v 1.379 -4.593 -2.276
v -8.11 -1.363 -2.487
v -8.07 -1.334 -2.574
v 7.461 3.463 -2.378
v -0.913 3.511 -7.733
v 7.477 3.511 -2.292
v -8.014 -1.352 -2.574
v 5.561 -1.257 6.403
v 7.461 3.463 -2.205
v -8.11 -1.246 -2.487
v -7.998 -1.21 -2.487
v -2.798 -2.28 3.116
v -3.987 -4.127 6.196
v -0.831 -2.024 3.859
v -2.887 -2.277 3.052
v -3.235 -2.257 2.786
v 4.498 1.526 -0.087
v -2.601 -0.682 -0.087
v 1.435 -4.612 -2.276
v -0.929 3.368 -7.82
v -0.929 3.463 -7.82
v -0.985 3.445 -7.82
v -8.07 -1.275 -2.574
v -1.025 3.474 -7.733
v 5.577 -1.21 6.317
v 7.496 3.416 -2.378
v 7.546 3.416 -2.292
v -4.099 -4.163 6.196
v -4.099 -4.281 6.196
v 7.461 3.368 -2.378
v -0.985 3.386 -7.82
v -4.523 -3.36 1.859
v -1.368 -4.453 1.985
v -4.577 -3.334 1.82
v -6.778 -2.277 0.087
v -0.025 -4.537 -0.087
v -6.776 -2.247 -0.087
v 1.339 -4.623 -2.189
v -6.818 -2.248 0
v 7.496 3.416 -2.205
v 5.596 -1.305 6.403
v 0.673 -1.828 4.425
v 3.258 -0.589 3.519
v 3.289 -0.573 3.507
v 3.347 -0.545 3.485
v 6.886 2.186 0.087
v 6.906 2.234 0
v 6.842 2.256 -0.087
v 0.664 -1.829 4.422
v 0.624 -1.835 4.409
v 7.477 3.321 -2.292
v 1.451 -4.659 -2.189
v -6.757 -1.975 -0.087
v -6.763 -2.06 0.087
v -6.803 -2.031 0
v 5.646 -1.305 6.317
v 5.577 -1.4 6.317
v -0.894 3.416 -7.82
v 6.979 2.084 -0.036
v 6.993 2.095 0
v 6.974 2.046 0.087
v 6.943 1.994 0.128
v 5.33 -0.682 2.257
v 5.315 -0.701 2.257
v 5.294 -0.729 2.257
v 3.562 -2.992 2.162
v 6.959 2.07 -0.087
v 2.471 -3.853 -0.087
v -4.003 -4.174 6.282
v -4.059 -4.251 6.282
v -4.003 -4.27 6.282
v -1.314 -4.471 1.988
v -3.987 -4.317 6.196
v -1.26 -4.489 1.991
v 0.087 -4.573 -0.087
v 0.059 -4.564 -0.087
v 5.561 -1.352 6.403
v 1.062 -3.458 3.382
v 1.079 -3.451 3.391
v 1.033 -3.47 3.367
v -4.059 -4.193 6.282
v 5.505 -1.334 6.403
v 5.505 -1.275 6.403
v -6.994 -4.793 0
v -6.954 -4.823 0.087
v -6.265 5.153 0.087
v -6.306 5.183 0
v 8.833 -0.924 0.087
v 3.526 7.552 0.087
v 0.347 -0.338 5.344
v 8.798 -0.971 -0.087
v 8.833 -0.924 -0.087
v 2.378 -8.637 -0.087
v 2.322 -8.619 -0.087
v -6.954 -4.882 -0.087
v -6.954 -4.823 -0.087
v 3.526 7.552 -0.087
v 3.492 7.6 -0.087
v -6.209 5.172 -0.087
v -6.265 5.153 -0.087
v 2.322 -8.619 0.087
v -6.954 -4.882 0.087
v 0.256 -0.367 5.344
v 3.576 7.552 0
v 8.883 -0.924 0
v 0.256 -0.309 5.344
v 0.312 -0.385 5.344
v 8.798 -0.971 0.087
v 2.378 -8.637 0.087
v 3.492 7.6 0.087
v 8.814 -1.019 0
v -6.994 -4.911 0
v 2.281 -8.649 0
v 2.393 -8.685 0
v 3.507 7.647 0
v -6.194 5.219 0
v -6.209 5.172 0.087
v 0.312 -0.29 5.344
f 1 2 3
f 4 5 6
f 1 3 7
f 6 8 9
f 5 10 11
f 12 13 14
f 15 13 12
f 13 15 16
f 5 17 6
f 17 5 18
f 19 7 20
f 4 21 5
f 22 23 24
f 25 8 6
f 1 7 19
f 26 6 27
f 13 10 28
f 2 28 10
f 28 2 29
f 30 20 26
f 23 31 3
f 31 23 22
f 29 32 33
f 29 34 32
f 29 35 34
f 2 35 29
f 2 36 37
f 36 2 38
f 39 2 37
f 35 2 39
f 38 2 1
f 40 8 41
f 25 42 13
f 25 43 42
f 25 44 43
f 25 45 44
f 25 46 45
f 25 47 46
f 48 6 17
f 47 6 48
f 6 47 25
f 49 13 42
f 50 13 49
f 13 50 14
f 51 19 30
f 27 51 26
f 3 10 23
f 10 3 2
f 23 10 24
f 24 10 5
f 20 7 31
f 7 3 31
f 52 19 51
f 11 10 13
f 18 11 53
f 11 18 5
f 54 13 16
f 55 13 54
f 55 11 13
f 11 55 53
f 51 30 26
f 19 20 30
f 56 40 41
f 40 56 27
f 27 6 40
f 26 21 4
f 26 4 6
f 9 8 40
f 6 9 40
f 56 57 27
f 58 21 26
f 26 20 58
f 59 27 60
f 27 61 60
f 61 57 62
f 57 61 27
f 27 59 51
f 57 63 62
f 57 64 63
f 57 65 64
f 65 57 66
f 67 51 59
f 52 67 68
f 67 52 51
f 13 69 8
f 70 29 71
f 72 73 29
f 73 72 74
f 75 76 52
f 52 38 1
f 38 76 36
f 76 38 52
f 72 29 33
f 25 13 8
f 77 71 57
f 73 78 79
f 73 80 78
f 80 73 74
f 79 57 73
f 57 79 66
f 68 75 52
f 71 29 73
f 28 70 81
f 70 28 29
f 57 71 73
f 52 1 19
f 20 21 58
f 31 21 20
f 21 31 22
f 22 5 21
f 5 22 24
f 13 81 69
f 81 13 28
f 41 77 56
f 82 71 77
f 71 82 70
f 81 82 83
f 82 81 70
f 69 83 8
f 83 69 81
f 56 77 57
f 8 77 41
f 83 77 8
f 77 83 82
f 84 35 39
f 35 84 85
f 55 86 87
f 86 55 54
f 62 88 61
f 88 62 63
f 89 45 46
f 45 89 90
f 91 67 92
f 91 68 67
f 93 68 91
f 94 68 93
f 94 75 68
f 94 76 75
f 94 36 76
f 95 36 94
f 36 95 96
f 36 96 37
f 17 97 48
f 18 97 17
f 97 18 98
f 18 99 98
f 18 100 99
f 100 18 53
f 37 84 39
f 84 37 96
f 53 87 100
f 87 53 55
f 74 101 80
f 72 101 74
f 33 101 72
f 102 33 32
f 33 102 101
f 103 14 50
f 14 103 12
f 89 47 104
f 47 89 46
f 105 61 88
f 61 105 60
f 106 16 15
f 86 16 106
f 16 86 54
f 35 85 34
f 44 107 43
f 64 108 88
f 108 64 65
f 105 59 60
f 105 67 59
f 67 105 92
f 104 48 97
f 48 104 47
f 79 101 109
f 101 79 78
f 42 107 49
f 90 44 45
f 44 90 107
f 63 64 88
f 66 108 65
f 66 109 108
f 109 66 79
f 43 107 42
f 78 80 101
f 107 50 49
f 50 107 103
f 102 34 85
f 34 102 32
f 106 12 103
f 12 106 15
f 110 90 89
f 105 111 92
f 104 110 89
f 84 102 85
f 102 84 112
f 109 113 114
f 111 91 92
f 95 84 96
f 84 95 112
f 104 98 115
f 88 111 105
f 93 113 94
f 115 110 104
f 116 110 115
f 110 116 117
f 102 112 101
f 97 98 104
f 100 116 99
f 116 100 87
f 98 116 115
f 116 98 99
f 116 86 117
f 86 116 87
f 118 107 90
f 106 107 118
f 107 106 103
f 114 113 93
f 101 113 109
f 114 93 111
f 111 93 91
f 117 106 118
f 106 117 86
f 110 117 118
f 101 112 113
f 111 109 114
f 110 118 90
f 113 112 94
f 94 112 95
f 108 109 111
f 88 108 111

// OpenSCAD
// Auto-generated OpenSCAD file

    inner_points = 10*[[0.23620735966763612, -0.8589852711237532, 6.281120552158003e-15], [0.3476109579235432, 0.7552090254358436, 7.186745320395964e-14], [-0.6913160481523587, -0.48522020059684634, -1.2256510252105723e-13], [-0.6224648379611696, 0.5124067391232119, -8.203051974478681e-14], [0.8782995612527119, -0.092357848796825, 1.2644704850972638e-13], [0.0296673985459932, -0.03378951119168972, 0.5257311121191336]];

    outer_points = 10*[[0.5545913541974953, -0.130465753147186, 0.6316754822336427], [-0.8029377257364648, -0.130465753147186, -0.24874986149718784], [0.7445891768936461, 0.3415637761071865, -0.22918975163436395], [-0.09440993522191399, 0.3415637761071865, -0.7733225386168263], [-0.4018328701327624, -0.422196045920001, 0.6195866695147354], [0.14198138773148855, -0.4564076590866669, -0.2189213021039538]];

    // Convex hull for inner set (I)
    module inner_hull() {
        hull() {
            for (p = inner_points) {
                translate(p) sphere(r=0.1);
            }
        }
    }

    // Convex hull for outer set (O) minus inner hull (O \ I)
    module outer_minus_inner() {
        difference() {
            hull() {
                for (p = outer_points) {
                    translate(p) sphere(r=0.1);
                }
            }
            inner_hull(); // Subtract inner hull
        }
    }

    // Convex hull for outer set (O) minus all translated inner hulls
    module outer_minus_AllTranslationInner() {
        difference() {
            hull() {
                for (p = outer_points) {
                    translate(p) sphere(r=0.1);
                }
            }
            hull() {
                translate([0,0,50]) inner_hull();
                translate([0,0,-50]) inner_hull();
            }; // Subtract translated inner hulls
        }
    }

    // Difference between outer_minus_inner and outer_minus_AllTranslationInner
    module outer_minus_inner_diff() {
        difference() {
            // Outer minus inner
            difference() {
                hull() {
                    for (p = outer_points) {
                        translate(p) sphere(r=0.1);
                    }
                }
                inner_hull();
            }

            // Subtract Outer minus AllTranslationInner
            difference() {
                hull() {
                    for (p = outer_points) {
                        translate(p) sphere(r=0.1);
                    }
                }
                hull() {
                    translate([0,0,50]) inner_hull();
                    translate([0,0,-50]) inner_hull();
                };
            }
        }
    }

    // Rendering all with colors applied
    color([1, 0, 0, 0.5]) inner_hull(); // Transparent red
    color([0, 1, 0, 1]) outer_minus_AllTranslationInner(); // Opaque green
    color([1, 1, 0, 1]) outer_minus_inner_diff(); // Opaque yellow
    
